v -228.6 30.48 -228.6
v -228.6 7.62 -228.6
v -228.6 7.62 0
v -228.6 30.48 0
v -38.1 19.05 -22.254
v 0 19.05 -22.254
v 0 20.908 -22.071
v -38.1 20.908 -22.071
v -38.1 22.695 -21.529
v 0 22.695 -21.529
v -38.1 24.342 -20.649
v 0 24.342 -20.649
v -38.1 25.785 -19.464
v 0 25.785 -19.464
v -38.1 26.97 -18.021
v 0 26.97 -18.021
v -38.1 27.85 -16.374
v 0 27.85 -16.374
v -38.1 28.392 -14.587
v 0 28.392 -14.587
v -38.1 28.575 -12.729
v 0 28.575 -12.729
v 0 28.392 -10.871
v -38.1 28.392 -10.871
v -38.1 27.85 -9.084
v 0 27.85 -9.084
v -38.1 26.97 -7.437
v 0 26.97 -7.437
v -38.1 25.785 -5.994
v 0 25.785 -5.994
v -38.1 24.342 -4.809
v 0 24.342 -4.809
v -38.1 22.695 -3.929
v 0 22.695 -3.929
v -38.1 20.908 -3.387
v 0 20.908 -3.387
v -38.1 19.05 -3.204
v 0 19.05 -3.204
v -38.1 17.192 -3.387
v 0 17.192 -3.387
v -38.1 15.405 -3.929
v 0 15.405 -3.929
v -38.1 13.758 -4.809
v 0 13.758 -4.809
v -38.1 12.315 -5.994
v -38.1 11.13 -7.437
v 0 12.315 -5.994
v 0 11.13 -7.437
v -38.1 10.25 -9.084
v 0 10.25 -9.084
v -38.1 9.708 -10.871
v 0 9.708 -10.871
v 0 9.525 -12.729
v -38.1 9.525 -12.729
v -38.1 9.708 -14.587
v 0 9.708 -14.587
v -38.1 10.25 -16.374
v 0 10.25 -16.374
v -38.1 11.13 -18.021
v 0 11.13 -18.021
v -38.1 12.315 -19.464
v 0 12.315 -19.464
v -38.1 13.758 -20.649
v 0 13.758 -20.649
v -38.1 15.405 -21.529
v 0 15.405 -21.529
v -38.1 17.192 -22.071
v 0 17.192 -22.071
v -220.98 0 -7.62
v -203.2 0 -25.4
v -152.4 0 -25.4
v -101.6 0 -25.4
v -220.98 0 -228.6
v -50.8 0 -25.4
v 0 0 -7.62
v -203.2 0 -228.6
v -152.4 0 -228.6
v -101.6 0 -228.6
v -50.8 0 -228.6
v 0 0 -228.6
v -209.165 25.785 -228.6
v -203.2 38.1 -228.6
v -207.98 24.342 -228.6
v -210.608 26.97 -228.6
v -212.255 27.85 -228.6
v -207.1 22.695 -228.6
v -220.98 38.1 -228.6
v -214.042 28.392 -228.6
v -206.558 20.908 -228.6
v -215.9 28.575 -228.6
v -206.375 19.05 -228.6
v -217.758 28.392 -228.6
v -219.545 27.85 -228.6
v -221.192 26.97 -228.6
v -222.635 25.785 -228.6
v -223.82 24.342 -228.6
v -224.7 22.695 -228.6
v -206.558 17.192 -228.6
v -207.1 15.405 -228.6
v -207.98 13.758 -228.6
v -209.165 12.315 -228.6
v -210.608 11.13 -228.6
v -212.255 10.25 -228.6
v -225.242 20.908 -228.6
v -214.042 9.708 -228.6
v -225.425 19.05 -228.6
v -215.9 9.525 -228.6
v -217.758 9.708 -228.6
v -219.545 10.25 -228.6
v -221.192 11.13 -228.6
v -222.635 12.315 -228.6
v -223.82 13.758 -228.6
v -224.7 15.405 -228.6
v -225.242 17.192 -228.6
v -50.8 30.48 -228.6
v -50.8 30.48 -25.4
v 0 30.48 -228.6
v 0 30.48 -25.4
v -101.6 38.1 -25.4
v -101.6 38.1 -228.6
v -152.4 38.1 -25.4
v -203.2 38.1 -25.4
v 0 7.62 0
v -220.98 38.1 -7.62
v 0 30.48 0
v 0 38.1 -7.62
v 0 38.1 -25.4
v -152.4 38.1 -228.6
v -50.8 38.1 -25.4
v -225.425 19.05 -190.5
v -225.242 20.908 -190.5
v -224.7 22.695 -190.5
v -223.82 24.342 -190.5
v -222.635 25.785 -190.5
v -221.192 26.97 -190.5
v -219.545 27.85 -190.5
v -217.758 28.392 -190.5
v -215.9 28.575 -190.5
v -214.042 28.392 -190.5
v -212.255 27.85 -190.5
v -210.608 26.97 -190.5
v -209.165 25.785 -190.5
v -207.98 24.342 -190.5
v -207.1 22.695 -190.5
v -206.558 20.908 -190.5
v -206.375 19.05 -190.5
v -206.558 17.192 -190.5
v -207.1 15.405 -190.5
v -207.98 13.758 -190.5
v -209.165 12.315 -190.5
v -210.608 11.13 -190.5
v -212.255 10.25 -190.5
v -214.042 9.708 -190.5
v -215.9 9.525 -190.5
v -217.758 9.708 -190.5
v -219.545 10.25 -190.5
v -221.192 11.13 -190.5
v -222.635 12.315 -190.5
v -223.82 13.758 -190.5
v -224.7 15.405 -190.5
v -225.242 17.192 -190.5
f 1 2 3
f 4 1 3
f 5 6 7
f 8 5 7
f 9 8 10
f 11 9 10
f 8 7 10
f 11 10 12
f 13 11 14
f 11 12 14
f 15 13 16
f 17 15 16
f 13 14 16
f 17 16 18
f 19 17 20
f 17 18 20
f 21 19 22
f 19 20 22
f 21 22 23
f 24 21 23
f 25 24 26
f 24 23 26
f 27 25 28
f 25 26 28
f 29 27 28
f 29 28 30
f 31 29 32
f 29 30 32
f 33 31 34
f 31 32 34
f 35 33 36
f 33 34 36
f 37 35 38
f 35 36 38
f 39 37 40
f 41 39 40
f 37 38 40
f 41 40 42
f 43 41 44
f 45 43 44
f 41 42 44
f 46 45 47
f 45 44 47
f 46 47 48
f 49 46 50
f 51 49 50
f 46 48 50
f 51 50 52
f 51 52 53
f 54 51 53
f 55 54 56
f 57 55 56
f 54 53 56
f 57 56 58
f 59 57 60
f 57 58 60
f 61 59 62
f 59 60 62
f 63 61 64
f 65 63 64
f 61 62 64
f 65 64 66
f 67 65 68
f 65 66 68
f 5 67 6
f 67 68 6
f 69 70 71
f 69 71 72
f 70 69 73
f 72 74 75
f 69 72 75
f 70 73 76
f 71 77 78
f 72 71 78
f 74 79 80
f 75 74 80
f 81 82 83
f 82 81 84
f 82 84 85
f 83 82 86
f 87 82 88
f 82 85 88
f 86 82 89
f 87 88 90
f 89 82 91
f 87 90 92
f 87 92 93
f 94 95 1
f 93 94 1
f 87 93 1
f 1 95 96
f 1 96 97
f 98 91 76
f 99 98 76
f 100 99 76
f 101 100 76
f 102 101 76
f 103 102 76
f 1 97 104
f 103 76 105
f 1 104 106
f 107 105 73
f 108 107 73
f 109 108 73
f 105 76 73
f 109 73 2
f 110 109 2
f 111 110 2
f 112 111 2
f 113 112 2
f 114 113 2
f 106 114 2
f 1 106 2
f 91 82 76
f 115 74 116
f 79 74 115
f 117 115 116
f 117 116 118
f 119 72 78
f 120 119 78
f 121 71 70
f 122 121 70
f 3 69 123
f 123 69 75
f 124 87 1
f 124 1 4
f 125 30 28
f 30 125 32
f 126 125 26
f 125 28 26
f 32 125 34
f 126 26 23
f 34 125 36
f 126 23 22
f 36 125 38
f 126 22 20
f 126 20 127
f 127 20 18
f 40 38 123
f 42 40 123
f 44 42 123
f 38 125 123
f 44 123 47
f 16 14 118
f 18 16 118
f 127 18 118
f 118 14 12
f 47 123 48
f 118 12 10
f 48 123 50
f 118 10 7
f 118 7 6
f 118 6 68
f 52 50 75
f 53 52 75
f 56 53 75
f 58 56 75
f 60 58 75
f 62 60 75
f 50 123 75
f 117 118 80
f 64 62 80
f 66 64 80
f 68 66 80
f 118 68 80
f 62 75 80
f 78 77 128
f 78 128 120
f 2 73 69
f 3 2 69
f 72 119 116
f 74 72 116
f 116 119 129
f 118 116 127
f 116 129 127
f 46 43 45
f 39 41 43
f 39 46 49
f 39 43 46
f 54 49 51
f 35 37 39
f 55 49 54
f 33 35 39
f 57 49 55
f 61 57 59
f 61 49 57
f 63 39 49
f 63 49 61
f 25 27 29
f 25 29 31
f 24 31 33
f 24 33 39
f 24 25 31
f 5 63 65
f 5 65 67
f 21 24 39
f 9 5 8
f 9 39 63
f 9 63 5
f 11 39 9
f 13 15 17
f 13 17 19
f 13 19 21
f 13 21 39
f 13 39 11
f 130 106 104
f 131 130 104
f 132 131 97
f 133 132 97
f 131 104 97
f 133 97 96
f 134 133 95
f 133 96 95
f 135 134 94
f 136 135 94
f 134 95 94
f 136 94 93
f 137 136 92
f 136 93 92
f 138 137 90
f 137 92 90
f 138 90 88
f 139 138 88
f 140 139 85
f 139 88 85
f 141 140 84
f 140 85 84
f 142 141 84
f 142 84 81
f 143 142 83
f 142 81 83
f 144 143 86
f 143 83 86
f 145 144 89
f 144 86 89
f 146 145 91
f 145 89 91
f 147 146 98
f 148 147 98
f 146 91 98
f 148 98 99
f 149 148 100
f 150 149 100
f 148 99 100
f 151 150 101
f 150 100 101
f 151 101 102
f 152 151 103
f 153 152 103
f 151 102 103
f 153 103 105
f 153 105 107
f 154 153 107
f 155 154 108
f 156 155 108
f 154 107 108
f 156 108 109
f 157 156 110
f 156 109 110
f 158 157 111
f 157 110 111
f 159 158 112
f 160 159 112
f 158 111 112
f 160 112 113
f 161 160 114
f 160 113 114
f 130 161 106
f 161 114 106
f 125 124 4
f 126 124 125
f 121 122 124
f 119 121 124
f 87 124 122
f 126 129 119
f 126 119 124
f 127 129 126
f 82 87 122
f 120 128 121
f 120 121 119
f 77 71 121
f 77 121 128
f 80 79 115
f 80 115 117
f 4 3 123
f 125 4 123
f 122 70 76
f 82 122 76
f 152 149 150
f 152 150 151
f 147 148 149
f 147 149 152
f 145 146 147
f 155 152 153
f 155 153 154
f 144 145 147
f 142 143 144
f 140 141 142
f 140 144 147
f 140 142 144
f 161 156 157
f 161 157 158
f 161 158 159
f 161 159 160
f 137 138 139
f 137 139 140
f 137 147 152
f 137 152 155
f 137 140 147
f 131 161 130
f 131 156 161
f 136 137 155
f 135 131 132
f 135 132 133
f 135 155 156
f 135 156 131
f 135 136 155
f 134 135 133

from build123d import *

# Parameters (mm, degrees)
SKETCH1_W           = 50.8
SKETCH1_H           = 203.2
BOSS_EXTRUDE2_DEPTH = 38.1
SKETCH2_R           = 9.525
CUT_EXTRUDE1_DEPTH  = 38.1
SKETCH3_R           = 9.525
CUT_EXTRUDE2_DEPTH  = 38.1
SKETCH4_W           = 254
SKETCH4_H           = 254.028971003
CUT_EXTRUDE3_DEPTH  = 7.62
CHAMFER1_SIZE       = 7.62


with BuildPart() as part:
    # Sketch1 → Boss-Extrude2 (new body)
    with BuildSketch(Plane(origin=(0, 0, 0), x_dir=(1, 0, 0), z_dir=(0, 1, 0))):
        Polygon((0, 0), (0, 25.4), (-50.8, 25.4), (-101.6, 25.4), (-152.4, 25.4), (-203.2, 25.4), (-203.2, 228.6), (-228.6, 228.6), (-228.6, 0), align=None)
        with Locations((-127, 127)):
            Rectangle(SKETCH1_W, SKETCH1_H)
        with Locations((-25.4, 127)):
            Rectangle(SKETCH1_W, SKETCH1_H)
    extrude(amount=BOSS_EXTRUDE2_DEPTH)

    # Sketch2 → Cut-Extrude1 (cut)
    with BuildSketch(Plane(origin=(0, 0, -228.6), x_dir=(-1, 0, 0), z_dir=(0, 0, -1))):
        with Locations((215.9, 19.05)):
            Circle(SKETCH2_R)
    extrude(amount=-CUT_EXTRUDE1_DEPTH, mode=Mode.SUBTRACT)

    # Sketch3 → Cut-Extrude2 (cut)
    with BuildSketch(Plane(origin=(0, 0, 0), x_dir=(0, 0, -1), z_dir=(1, 0, 0))):
        with Locations((12.728971003, 19.05)):
            Circle(SKETCH3_R)
    extrude(amount=-CUT_EXTRUDE2_DEPTH, mode=Mode.SUBTRACT)

    # Sketch4 → Cut-Extrude3 (cut)
    with BuildSketch(Plane(origin=(0, 38.1, 0), x_dir=(1, 0, 0), z_dir=(0, 1, 0))):
        with Locations((50.8, 152.414485501)):
            Rectangle(SKETCH4_W, SKETCH4_H)
    extrude(amount=-CUT_EXTRUDE3_DEPTH, mode=Mode.SUBTRACT)

    # Chamfer1
    chamfer1_edges = [part.edges().sort_by_distance(p)[0] for p in [
        (-114.3, 0, 0),
        (-228.6, 0, -114.3),
        (-228.6, 38.1, -114.3),
        (-114.3, 38.1, 0),
    ]]
    chamfer(chamfer1_edges, length=CHAMFER1_SIZE)


solid = part.part
